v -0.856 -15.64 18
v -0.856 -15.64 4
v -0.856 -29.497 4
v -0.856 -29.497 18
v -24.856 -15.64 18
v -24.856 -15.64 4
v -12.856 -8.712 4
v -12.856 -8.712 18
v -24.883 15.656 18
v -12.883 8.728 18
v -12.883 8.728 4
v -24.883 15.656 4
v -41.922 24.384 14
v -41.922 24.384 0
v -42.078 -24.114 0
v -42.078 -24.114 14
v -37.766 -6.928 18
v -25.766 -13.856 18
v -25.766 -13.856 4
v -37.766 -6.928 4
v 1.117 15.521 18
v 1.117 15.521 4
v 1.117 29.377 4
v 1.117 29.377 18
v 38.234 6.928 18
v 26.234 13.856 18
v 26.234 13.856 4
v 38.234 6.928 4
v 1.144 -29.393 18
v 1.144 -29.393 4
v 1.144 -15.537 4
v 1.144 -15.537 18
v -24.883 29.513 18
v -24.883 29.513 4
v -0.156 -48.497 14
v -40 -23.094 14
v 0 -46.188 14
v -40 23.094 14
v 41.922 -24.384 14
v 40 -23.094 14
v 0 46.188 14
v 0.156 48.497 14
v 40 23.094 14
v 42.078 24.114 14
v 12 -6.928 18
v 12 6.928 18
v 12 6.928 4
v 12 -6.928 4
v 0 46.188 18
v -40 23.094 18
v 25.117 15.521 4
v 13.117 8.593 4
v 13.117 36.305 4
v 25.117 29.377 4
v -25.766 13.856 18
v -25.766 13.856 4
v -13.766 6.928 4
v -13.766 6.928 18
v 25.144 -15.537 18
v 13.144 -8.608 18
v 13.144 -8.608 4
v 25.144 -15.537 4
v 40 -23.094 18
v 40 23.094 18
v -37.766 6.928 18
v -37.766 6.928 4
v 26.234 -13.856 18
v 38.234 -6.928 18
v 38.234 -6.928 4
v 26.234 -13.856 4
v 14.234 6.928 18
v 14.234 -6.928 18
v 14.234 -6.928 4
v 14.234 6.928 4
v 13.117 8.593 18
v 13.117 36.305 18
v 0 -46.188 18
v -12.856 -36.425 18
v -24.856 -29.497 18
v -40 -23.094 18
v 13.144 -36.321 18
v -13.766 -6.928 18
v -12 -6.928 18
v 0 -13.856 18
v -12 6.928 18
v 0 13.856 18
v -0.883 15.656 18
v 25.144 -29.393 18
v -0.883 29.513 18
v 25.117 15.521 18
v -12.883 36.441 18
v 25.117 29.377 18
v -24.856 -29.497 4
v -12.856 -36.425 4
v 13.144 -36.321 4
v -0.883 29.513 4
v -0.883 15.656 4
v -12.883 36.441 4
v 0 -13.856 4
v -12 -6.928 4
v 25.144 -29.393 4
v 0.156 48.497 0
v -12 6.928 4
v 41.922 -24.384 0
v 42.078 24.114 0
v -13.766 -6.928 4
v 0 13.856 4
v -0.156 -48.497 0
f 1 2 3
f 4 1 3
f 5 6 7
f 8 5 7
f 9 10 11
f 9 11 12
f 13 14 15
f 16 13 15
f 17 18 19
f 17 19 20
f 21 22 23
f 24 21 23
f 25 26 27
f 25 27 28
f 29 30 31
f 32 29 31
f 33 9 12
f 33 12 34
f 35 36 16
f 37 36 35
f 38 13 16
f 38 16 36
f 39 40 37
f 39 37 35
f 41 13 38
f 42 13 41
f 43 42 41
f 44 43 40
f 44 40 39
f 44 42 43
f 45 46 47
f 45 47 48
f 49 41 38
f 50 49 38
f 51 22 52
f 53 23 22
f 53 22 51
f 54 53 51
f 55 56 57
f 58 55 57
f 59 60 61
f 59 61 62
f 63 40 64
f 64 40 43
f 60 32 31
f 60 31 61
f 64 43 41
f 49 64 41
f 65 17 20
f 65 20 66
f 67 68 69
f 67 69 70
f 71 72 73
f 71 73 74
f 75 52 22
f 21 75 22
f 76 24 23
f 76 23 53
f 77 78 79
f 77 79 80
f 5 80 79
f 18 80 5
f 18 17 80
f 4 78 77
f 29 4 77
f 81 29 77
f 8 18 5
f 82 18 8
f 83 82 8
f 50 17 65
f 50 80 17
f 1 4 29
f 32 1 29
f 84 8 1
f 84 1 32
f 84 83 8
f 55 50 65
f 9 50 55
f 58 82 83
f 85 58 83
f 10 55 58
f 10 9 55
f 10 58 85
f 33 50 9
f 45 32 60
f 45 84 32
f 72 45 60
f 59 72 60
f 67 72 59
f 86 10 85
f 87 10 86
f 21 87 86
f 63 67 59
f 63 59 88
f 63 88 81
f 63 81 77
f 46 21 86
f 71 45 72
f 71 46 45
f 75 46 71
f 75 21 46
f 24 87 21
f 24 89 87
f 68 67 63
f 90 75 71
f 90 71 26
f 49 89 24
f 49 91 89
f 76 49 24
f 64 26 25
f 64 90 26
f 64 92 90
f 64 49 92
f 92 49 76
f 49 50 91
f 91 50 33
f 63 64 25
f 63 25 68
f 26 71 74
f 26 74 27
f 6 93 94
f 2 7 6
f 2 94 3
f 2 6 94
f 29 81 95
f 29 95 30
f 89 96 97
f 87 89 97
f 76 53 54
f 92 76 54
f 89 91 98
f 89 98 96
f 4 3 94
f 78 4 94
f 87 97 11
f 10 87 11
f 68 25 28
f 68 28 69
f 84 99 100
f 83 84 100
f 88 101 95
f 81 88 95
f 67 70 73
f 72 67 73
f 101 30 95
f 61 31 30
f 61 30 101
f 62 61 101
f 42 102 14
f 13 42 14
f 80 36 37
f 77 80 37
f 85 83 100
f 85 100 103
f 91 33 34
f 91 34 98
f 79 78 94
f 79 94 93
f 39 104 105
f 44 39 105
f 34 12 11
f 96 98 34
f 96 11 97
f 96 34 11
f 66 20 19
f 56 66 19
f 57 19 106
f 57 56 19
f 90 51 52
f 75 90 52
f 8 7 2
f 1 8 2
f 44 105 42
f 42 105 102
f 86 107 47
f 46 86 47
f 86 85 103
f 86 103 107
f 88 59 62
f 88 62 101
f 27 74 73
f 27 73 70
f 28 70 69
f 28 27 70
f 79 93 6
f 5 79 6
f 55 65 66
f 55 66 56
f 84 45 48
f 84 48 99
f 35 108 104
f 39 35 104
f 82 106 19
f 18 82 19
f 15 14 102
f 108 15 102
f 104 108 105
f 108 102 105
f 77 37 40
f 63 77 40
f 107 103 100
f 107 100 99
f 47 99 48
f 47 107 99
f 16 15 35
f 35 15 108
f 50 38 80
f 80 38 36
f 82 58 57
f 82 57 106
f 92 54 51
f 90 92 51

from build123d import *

# Parameters (mm, degrees)
F1_DEPTH = 14
F2_DEPTH = 18
F3_DEPTH = 4


with BuildPart() as f1:
    # F0 (on Top) → F1 (new body)
    with BuildSketch(Plane.XY):
        Polygon((42.077698, 24.113634), (0.155829, 48.497172), (-41.921869, 24.383538), (-42.077698, -24.113634), (-0.155829, -48.497172), (41.921869, -24.383538), align=None)
        Polygon((-40, 23.094011), (0, 46.188022), (40, 23.094011), (40, -23.094011), (0, -46.188022), (-40, -23.094011), align=None, mode=Mode.SUBTRACT)
    extrude(amount=F1_DEPTH)

    # F0 (on Top) → F2 (join)
    with BuildSketch(Plane.XY):
        Polygon((40, 23.094011), (0, 46.188022), (-40, 23.094011), (-40, -23.094011), (0, -46.188022), (40, -23.094011), align=None)
        Polygon((-12.855593, -8.712208), (-0.855593, -15.640412), (-0.855593, -29.496818), (-12.855593, -36.425021), (-24.855593, -29.496818), (-24.855593, -15.640412), align=None, mode=Mode.SUBTRACT)
        Polygon((13.144407, -8.6083), (25.144407, -15.536503), (25.144407, -29.392909), (13.144407, -36.321113), (1.144407, -29.392909), (1.144407, -15.536503), align=None, mode=Mode.SUBTRACT)
        Polygon((-25.765606, 13.856406), (-13.765606, 6.928203), (-13.765606, -6.928203), (-25.765606, -13.856406), (-37.765606, -6.928203), (-37.765606, 6.928203), align=None, mode=Mode.SUBTRACT)
        Polygon((-12.882803, 36.440731), (-0.882803, 29.512527), (-0.882803, 15.656121), (-12.882803, 8.727918), (-24.882803, 15.656121), (-24.882803, 29.512527), align=None, mode=Mode.SUBTRACT)
        Polygon((0, 13.856406), (12, 6.928203), (12, -6.928203), (0, -13.856406), (-12, -6.928203), (-12, 6.928203), align=None, mode=Mode.SUBTRACT)
        Polygon((13.117197, 36.305403), (25.117197, 29.3772), (25.117197, 15.520794), (13.117197, 8.59259), (1.117197, 15.520794), (1.117197, 29.3772), align=None, mode=Mode.SUBTRACT)
        Polygon((26.234394, 13.856406), (38.234394, 6.928203), (38.234394, -6.928203), (26.234394, -13.856406), (14.234394, -6.928203), (14.234394, 6.928203), align=None, mode=Mode.SUBTRACT)
    extrude(amount=F2_DEPTH)

    # F0 (on Top) → F3 (join)
    with BuildSketch(Plane.XY):
        Polygon((25.117197, 15.520794), (25.117197, 29.3772), (13.117197, 36.305403), (1.117197, 29.3772), (1.117197, 15.520794), (13.117197, 8.59259), align=None)
        Polygon((-0.882803, 15.656121), (-0.882803, 29.512527), (-12.882803, 36.440731), (-24.882803, 29.512527), (-24.882803, 15.656121), (-12.882803, 8.727918), align=None)
        Polygon((-13.765606, -6.928203), (-13.765606, 6.928203), (-25.765606, 13.856406), (-37.765606, 6.928203), (-37.765606, -6.928203), (-25.765606, -13.856406), align=None)
        Polygon((12, -6.928203), (12, 6.928203), (0, 13.856406), (-12, 6.928203), (-12, -6.928203), (0, -13.856406), align=None)
        Polygon((38.234394, -6.928203), (38.234394, 6.928203), (26.234394, 13.856406), (14.234394, 6.928203), (14.234394, -6.928203), (26.234394, -13.856406), align=None)
        Polygon((25.144407, -29.392909), (25.144407, -15.536503), (13.144407, -8.6083), (1.144407, -15.536503), (1.144407, -29.392909), (13.144407, -36.321113), align=None)
        Polygon((-0.855593, -29.496818), (-0.855593, -15.640412), (-12.855593, -8.712208), (-24.855593, -15.640412), (-24.855593, -29.496818), (-12.855593, -36.425021), align=None)
    extrude(amount=F3_DEPTH)


solid = f1.part
